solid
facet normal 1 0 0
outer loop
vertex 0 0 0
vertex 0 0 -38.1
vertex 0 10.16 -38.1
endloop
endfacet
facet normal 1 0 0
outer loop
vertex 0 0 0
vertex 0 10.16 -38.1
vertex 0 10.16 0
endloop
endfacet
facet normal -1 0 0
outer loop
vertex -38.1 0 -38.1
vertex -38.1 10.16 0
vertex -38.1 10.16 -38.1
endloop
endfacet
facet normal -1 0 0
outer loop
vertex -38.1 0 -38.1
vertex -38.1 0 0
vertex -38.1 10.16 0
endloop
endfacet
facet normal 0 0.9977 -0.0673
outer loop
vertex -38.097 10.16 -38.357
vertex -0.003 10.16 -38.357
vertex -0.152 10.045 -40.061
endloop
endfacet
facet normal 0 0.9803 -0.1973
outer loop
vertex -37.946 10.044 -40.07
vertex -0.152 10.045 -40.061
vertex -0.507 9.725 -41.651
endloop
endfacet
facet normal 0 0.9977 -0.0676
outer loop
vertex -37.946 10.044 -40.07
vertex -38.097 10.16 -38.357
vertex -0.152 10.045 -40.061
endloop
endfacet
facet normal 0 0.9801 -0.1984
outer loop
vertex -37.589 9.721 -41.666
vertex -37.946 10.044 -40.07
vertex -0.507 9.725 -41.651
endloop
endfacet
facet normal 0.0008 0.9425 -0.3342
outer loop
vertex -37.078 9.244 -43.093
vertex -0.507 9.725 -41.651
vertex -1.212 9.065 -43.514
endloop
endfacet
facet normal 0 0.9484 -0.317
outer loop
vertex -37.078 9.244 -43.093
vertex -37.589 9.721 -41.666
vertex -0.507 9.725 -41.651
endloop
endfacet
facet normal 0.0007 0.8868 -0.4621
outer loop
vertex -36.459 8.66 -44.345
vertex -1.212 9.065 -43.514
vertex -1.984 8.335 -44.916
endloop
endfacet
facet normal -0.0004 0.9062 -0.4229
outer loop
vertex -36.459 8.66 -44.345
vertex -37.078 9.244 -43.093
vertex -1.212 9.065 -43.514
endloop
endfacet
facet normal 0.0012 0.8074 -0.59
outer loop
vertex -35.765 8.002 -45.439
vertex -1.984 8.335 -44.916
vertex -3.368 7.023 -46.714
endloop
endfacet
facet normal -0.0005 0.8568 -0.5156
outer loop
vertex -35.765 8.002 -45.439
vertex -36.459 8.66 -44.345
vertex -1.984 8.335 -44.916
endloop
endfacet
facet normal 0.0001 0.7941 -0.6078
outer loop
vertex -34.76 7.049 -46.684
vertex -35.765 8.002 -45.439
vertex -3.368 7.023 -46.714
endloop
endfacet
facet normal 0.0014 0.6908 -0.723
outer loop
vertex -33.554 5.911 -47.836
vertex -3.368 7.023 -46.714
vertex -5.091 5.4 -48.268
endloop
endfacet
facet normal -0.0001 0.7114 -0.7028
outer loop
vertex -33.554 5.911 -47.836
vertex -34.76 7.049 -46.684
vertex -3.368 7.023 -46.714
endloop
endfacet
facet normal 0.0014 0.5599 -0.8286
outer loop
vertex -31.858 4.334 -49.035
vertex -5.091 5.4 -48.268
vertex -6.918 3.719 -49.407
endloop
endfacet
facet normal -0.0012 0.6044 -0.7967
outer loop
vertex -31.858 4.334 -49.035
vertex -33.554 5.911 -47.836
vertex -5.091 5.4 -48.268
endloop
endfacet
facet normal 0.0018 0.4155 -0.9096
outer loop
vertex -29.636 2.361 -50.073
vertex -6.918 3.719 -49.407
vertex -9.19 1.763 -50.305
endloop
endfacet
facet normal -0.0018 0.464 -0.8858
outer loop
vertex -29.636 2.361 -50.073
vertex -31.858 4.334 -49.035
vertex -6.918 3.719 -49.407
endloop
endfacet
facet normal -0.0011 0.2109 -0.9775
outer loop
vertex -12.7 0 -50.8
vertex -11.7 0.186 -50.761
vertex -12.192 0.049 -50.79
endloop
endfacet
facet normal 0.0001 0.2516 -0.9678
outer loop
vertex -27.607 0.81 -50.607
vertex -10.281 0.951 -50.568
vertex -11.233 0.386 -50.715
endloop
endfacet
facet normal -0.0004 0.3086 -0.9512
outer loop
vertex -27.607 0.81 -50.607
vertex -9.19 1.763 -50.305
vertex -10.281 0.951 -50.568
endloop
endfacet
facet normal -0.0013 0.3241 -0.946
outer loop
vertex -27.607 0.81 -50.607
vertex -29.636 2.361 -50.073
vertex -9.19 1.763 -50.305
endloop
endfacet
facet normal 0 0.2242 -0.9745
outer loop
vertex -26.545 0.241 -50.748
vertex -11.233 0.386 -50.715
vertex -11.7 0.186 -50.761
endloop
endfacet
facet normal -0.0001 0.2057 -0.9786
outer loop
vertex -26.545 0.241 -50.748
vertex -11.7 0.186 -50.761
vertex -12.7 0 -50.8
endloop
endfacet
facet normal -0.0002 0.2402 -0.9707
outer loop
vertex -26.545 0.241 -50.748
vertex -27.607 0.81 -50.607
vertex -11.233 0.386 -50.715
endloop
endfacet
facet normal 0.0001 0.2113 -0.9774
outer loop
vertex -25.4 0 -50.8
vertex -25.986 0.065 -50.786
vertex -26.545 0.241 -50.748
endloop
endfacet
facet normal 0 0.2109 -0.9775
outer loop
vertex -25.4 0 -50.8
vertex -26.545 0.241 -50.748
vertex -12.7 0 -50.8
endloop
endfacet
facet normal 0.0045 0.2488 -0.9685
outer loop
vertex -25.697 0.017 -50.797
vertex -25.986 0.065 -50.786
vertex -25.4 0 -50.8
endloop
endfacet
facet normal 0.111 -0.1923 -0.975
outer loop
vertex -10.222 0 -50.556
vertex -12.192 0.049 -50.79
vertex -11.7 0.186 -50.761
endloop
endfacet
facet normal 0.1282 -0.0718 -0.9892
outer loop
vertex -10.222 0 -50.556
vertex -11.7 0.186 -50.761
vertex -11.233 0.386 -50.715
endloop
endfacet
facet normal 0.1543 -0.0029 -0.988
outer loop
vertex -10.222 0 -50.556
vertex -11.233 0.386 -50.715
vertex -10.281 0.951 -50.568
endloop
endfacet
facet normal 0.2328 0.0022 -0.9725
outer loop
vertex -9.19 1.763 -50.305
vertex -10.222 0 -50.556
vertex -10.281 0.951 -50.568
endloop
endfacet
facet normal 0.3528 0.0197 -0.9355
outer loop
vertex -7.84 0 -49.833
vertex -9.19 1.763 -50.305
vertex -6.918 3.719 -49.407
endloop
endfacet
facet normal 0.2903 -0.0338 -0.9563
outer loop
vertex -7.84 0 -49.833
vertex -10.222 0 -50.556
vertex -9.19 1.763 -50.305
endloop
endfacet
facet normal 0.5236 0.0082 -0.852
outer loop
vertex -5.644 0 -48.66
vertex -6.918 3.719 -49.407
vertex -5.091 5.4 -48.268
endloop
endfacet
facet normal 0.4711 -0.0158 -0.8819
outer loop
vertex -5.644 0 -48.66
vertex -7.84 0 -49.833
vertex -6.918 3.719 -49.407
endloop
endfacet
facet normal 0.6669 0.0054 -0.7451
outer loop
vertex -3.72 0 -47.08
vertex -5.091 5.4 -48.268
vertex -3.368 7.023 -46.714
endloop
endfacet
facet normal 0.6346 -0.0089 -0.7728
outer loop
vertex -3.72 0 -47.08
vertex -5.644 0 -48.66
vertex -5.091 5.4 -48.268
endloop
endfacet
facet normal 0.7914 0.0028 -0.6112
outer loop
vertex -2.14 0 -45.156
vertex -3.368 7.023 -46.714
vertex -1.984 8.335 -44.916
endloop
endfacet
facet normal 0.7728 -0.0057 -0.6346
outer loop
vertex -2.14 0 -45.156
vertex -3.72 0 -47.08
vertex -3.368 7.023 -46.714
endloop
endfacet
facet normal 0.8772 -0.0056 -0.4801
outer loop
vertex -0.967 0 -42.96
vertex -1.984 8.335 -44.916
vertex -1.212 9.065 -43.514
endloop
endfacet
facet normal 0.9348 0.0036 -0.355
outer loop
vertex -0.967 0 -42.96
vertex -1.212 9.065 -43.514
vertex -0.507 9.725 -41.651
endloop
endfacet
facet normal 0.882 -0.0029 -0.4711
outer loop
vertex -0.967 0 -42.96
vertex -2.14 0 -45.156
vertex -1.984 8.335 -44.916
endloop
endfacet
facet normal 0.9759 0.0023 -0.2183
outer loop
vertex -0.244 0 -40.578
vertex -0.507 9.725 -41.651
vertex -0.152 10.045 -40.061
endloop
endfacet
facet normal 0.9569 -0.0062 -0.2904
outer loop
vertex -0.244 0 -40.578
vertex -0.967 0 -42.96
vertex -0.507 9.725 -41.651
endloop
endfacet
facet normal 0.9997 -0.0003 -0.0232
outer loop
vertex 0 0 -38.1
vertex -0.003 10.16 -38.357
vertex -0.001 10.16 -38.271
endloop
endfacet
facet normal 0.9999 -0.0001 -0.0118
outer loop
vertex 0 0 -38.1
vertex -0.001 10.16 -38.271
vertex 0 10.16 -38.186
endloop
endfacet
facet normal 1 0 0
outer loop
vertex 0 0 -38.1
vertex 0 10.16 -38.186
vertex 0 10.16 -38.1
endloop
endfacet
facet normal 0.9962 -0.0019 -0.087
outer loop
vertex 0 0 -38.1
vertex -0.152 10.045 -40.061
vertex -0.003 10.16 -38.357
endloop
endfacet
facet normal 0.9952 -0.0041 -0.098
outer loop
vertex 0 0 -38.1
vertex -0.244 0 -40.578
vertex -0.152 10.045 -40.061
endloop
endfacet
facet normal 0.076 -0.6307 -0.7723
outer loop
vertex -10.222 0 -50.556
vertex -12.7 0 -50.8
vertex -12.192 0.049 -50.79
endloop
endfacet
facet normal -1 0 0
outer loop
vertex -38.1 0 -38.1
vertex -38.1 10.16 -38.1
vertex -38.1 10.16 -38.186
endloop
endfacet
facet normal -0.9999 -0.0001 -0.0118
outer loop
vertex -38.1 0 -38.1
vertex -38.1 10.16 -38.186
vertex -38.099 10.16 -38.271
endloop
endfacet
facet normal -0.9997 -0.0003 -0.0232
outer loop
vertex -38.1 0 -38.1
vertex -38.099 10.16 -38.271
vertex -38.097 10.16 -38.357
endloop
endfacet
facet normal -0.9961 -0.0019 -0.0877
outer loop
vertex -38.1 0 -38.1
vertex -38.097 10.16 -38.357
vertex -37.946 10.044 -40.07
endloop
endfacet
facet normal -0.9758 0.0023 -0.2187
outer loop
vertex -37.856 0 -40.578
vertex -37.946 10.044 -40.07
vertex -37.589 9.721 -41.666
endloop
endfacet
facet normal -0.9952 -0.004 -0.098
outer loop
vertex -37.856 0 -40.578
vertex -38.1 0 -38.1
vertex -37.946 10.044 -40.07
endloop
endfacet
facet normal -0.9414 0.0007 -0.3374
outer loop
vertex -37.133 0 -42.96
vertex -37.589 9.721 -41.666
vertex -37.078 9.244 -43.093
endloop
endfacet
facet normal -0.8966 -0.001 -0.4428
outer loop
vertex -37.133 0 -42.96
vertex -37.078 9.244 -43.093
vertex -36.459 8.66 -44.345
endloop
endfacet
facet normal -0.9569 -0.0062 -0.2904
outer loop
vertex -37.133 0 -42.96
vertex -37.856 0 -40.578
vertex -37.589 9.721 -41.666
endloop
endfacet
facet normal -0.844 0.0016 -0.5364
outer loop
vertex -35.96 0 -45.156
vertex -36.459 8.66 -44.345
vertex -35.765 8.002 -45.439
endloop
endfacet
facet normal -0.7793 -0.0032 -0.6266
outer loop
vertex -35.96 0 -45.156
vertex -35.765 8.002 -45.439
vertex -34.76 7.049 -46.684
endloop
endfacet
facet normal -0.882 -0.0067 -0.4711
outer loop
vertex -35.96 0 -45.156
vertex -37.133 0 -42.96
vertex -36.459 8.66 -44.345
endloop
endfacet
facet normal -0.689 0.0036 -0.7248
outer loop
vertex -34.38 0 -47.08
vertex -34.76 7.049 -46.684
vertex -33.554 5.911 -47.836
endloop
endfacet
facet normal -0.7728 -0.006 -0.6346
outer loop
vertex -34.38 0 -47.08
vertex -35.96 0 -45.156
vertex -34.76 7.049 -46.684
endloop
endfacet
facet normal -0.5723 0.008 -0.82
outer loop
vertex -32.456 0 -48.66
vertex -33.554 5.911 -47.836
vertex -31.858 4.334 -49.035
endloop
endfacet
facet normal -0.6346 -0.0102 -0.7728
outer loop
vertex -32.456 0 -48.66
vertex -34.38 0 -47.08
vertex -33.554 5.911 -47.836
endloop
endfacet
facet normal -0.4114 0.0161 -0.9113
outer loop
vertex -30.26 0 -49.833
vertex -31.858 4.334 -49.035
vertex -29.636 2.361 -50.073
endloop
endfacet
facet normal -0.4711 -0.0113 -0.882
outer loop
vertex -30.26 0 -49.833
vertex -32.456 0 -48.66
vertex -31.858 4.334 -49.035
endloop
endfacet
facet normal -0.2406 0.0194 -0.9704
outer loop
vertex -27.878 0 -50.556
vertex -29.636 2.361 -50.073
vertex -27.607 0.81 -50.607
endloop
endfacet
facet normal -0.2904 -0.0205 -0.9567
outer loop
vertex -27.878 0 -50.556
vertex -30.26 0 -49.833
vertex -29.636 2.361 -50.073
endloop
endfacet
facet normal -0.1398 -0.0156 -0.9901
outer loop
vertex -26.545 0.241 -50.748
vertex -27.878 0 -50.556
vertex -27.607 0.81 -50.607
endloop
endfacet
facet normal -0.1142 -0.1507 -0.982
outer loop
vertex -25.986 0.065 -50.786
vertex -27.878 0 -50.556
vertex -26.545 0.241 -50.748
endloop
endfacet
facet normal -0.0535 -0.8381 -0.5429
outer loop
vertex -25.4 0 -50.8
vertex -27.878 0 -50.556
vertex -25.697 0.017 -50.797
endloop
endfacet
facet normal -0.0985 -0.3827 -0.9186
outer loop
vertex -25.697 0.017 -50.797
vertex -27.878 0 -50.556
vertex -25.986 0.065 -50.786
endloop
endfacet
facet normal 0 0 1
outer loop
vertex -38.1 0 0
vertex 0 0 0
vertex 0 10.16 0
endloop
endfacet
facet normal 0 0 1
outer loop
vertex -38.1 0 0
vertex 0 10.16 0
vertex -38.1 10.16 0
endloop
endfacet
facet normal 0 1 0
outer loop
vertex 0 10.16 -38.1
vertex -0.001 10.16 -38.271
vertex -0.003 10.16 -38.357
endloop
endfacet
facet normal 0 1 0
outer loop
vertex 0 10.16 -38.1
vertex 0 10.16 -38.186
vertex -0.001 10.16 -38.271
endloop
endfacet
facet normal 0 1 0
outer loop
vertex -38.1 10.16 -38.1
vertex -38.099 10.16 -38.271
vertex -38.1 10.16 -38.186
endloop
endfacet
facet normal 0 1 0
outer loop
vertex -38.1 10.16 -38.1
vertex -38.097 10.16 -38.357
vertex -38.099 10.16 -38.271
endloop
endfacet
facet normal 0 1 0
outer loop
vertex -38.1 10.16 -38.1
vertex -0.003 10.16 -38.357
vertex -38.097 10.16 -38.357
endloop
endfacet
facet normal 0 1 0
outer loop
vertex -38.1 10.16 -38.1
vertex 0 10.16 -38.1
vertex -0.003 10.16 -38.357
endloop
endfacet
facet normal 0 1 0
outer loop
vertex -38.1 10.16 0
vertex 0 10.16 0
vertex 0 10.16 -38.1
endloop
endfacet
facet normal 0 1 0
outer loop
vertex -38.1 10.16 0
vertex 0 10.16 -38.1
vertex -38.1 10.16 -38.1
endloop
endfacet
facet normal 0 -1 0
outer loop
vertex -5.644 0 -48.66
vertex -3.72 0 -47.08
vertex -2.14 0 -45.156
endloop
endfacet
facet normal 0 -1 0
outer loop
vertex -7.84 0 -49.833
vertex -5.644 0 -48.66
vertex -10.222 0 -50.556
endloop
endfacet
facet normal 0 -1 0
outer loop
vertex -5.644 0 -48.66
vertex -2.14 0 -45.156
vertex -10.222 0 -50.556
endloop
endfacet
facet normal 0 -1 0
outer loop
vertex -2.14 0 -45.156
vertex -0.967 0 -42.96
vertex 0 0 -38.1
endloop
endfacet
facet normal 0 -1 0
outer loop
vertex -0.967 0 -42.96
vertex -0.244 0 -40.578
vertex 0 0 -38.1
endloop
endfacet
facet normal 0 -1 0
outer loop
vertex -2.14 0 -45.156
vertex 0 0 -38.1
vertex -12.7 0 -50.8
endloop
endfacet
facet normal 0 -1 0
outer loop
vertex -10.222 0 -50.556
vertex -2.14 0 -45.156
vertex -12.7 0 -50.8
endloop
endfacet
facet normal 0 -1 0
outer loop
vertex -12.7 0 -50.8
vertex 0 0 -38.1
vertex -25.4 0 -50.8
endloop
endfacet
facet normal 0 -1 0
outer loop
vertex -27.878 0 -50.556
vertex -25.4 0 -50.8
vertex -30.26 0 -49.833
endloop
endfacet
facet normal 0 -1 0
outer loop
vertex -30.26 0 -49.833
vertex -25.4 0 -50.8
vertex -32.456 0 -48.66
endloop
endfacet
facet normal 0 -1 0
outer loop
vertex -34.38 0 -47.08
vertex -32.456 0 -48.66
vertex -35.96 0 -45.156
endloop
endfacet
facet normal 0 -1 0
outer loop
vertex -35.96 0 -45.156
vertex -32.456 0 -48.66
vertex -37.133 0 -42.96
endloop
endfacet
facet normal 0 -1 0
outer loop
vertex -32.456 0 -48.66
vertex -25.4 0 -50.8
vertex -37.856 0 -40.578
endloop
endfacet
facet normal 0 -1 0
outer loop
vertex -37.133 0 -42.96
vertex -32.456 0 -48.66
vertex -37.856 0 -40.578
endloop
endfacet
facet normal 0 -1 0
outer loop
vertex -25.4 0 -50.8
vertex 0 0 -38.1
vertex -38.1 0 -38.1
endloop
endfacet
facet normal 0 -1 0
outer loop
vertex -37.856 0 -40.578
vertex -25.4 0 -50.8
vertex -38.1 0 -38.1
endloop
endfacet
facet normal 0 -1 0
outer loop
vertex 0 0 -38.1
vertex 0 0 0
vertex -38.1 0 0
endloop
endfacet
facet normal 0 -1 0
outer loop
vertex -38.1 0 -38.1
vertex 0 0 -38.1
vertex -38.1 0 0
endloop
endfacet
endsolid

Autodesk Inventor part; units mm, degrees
ref_plane "YZ Plane" through (0, 0, 0) normal (1, 0, 0) x (0, 1, 0)
ref_plane "XZ Plane" through (0, 0, 0) normal (0, 1, 0) x (-1, 0, 0)
ref_plane "XY Plane" through (0, 0, 0) normal (0, 0, 1) x (1, 0, 0)
sketch "Sketch1" plane through (0, 0, 0) normal (0, 1, 0) x (-1, 0, 0)
  line L0 (0, 0) -> (38.1, 0)
  line L1 (38.1, 0) -> (38.1, -50.8)
  line L2 (38.1, -50.8) -> (0, -50.8)
  line L3 (0, -50.8) -> (0, 0)
  dimension "d0" = 38.1
  dimension "d1" = 50.8
extrude "Extrusion1" add sketch "Sketch1" along normal blind 10.16
fillet "Fillet1" radius 12.7 3 edges at (0, 5.08, -50.8) (-38.1, 5.08, -50.8) (-19.05, 10.16, -50.8)
properties part number "EndStopMounts"
